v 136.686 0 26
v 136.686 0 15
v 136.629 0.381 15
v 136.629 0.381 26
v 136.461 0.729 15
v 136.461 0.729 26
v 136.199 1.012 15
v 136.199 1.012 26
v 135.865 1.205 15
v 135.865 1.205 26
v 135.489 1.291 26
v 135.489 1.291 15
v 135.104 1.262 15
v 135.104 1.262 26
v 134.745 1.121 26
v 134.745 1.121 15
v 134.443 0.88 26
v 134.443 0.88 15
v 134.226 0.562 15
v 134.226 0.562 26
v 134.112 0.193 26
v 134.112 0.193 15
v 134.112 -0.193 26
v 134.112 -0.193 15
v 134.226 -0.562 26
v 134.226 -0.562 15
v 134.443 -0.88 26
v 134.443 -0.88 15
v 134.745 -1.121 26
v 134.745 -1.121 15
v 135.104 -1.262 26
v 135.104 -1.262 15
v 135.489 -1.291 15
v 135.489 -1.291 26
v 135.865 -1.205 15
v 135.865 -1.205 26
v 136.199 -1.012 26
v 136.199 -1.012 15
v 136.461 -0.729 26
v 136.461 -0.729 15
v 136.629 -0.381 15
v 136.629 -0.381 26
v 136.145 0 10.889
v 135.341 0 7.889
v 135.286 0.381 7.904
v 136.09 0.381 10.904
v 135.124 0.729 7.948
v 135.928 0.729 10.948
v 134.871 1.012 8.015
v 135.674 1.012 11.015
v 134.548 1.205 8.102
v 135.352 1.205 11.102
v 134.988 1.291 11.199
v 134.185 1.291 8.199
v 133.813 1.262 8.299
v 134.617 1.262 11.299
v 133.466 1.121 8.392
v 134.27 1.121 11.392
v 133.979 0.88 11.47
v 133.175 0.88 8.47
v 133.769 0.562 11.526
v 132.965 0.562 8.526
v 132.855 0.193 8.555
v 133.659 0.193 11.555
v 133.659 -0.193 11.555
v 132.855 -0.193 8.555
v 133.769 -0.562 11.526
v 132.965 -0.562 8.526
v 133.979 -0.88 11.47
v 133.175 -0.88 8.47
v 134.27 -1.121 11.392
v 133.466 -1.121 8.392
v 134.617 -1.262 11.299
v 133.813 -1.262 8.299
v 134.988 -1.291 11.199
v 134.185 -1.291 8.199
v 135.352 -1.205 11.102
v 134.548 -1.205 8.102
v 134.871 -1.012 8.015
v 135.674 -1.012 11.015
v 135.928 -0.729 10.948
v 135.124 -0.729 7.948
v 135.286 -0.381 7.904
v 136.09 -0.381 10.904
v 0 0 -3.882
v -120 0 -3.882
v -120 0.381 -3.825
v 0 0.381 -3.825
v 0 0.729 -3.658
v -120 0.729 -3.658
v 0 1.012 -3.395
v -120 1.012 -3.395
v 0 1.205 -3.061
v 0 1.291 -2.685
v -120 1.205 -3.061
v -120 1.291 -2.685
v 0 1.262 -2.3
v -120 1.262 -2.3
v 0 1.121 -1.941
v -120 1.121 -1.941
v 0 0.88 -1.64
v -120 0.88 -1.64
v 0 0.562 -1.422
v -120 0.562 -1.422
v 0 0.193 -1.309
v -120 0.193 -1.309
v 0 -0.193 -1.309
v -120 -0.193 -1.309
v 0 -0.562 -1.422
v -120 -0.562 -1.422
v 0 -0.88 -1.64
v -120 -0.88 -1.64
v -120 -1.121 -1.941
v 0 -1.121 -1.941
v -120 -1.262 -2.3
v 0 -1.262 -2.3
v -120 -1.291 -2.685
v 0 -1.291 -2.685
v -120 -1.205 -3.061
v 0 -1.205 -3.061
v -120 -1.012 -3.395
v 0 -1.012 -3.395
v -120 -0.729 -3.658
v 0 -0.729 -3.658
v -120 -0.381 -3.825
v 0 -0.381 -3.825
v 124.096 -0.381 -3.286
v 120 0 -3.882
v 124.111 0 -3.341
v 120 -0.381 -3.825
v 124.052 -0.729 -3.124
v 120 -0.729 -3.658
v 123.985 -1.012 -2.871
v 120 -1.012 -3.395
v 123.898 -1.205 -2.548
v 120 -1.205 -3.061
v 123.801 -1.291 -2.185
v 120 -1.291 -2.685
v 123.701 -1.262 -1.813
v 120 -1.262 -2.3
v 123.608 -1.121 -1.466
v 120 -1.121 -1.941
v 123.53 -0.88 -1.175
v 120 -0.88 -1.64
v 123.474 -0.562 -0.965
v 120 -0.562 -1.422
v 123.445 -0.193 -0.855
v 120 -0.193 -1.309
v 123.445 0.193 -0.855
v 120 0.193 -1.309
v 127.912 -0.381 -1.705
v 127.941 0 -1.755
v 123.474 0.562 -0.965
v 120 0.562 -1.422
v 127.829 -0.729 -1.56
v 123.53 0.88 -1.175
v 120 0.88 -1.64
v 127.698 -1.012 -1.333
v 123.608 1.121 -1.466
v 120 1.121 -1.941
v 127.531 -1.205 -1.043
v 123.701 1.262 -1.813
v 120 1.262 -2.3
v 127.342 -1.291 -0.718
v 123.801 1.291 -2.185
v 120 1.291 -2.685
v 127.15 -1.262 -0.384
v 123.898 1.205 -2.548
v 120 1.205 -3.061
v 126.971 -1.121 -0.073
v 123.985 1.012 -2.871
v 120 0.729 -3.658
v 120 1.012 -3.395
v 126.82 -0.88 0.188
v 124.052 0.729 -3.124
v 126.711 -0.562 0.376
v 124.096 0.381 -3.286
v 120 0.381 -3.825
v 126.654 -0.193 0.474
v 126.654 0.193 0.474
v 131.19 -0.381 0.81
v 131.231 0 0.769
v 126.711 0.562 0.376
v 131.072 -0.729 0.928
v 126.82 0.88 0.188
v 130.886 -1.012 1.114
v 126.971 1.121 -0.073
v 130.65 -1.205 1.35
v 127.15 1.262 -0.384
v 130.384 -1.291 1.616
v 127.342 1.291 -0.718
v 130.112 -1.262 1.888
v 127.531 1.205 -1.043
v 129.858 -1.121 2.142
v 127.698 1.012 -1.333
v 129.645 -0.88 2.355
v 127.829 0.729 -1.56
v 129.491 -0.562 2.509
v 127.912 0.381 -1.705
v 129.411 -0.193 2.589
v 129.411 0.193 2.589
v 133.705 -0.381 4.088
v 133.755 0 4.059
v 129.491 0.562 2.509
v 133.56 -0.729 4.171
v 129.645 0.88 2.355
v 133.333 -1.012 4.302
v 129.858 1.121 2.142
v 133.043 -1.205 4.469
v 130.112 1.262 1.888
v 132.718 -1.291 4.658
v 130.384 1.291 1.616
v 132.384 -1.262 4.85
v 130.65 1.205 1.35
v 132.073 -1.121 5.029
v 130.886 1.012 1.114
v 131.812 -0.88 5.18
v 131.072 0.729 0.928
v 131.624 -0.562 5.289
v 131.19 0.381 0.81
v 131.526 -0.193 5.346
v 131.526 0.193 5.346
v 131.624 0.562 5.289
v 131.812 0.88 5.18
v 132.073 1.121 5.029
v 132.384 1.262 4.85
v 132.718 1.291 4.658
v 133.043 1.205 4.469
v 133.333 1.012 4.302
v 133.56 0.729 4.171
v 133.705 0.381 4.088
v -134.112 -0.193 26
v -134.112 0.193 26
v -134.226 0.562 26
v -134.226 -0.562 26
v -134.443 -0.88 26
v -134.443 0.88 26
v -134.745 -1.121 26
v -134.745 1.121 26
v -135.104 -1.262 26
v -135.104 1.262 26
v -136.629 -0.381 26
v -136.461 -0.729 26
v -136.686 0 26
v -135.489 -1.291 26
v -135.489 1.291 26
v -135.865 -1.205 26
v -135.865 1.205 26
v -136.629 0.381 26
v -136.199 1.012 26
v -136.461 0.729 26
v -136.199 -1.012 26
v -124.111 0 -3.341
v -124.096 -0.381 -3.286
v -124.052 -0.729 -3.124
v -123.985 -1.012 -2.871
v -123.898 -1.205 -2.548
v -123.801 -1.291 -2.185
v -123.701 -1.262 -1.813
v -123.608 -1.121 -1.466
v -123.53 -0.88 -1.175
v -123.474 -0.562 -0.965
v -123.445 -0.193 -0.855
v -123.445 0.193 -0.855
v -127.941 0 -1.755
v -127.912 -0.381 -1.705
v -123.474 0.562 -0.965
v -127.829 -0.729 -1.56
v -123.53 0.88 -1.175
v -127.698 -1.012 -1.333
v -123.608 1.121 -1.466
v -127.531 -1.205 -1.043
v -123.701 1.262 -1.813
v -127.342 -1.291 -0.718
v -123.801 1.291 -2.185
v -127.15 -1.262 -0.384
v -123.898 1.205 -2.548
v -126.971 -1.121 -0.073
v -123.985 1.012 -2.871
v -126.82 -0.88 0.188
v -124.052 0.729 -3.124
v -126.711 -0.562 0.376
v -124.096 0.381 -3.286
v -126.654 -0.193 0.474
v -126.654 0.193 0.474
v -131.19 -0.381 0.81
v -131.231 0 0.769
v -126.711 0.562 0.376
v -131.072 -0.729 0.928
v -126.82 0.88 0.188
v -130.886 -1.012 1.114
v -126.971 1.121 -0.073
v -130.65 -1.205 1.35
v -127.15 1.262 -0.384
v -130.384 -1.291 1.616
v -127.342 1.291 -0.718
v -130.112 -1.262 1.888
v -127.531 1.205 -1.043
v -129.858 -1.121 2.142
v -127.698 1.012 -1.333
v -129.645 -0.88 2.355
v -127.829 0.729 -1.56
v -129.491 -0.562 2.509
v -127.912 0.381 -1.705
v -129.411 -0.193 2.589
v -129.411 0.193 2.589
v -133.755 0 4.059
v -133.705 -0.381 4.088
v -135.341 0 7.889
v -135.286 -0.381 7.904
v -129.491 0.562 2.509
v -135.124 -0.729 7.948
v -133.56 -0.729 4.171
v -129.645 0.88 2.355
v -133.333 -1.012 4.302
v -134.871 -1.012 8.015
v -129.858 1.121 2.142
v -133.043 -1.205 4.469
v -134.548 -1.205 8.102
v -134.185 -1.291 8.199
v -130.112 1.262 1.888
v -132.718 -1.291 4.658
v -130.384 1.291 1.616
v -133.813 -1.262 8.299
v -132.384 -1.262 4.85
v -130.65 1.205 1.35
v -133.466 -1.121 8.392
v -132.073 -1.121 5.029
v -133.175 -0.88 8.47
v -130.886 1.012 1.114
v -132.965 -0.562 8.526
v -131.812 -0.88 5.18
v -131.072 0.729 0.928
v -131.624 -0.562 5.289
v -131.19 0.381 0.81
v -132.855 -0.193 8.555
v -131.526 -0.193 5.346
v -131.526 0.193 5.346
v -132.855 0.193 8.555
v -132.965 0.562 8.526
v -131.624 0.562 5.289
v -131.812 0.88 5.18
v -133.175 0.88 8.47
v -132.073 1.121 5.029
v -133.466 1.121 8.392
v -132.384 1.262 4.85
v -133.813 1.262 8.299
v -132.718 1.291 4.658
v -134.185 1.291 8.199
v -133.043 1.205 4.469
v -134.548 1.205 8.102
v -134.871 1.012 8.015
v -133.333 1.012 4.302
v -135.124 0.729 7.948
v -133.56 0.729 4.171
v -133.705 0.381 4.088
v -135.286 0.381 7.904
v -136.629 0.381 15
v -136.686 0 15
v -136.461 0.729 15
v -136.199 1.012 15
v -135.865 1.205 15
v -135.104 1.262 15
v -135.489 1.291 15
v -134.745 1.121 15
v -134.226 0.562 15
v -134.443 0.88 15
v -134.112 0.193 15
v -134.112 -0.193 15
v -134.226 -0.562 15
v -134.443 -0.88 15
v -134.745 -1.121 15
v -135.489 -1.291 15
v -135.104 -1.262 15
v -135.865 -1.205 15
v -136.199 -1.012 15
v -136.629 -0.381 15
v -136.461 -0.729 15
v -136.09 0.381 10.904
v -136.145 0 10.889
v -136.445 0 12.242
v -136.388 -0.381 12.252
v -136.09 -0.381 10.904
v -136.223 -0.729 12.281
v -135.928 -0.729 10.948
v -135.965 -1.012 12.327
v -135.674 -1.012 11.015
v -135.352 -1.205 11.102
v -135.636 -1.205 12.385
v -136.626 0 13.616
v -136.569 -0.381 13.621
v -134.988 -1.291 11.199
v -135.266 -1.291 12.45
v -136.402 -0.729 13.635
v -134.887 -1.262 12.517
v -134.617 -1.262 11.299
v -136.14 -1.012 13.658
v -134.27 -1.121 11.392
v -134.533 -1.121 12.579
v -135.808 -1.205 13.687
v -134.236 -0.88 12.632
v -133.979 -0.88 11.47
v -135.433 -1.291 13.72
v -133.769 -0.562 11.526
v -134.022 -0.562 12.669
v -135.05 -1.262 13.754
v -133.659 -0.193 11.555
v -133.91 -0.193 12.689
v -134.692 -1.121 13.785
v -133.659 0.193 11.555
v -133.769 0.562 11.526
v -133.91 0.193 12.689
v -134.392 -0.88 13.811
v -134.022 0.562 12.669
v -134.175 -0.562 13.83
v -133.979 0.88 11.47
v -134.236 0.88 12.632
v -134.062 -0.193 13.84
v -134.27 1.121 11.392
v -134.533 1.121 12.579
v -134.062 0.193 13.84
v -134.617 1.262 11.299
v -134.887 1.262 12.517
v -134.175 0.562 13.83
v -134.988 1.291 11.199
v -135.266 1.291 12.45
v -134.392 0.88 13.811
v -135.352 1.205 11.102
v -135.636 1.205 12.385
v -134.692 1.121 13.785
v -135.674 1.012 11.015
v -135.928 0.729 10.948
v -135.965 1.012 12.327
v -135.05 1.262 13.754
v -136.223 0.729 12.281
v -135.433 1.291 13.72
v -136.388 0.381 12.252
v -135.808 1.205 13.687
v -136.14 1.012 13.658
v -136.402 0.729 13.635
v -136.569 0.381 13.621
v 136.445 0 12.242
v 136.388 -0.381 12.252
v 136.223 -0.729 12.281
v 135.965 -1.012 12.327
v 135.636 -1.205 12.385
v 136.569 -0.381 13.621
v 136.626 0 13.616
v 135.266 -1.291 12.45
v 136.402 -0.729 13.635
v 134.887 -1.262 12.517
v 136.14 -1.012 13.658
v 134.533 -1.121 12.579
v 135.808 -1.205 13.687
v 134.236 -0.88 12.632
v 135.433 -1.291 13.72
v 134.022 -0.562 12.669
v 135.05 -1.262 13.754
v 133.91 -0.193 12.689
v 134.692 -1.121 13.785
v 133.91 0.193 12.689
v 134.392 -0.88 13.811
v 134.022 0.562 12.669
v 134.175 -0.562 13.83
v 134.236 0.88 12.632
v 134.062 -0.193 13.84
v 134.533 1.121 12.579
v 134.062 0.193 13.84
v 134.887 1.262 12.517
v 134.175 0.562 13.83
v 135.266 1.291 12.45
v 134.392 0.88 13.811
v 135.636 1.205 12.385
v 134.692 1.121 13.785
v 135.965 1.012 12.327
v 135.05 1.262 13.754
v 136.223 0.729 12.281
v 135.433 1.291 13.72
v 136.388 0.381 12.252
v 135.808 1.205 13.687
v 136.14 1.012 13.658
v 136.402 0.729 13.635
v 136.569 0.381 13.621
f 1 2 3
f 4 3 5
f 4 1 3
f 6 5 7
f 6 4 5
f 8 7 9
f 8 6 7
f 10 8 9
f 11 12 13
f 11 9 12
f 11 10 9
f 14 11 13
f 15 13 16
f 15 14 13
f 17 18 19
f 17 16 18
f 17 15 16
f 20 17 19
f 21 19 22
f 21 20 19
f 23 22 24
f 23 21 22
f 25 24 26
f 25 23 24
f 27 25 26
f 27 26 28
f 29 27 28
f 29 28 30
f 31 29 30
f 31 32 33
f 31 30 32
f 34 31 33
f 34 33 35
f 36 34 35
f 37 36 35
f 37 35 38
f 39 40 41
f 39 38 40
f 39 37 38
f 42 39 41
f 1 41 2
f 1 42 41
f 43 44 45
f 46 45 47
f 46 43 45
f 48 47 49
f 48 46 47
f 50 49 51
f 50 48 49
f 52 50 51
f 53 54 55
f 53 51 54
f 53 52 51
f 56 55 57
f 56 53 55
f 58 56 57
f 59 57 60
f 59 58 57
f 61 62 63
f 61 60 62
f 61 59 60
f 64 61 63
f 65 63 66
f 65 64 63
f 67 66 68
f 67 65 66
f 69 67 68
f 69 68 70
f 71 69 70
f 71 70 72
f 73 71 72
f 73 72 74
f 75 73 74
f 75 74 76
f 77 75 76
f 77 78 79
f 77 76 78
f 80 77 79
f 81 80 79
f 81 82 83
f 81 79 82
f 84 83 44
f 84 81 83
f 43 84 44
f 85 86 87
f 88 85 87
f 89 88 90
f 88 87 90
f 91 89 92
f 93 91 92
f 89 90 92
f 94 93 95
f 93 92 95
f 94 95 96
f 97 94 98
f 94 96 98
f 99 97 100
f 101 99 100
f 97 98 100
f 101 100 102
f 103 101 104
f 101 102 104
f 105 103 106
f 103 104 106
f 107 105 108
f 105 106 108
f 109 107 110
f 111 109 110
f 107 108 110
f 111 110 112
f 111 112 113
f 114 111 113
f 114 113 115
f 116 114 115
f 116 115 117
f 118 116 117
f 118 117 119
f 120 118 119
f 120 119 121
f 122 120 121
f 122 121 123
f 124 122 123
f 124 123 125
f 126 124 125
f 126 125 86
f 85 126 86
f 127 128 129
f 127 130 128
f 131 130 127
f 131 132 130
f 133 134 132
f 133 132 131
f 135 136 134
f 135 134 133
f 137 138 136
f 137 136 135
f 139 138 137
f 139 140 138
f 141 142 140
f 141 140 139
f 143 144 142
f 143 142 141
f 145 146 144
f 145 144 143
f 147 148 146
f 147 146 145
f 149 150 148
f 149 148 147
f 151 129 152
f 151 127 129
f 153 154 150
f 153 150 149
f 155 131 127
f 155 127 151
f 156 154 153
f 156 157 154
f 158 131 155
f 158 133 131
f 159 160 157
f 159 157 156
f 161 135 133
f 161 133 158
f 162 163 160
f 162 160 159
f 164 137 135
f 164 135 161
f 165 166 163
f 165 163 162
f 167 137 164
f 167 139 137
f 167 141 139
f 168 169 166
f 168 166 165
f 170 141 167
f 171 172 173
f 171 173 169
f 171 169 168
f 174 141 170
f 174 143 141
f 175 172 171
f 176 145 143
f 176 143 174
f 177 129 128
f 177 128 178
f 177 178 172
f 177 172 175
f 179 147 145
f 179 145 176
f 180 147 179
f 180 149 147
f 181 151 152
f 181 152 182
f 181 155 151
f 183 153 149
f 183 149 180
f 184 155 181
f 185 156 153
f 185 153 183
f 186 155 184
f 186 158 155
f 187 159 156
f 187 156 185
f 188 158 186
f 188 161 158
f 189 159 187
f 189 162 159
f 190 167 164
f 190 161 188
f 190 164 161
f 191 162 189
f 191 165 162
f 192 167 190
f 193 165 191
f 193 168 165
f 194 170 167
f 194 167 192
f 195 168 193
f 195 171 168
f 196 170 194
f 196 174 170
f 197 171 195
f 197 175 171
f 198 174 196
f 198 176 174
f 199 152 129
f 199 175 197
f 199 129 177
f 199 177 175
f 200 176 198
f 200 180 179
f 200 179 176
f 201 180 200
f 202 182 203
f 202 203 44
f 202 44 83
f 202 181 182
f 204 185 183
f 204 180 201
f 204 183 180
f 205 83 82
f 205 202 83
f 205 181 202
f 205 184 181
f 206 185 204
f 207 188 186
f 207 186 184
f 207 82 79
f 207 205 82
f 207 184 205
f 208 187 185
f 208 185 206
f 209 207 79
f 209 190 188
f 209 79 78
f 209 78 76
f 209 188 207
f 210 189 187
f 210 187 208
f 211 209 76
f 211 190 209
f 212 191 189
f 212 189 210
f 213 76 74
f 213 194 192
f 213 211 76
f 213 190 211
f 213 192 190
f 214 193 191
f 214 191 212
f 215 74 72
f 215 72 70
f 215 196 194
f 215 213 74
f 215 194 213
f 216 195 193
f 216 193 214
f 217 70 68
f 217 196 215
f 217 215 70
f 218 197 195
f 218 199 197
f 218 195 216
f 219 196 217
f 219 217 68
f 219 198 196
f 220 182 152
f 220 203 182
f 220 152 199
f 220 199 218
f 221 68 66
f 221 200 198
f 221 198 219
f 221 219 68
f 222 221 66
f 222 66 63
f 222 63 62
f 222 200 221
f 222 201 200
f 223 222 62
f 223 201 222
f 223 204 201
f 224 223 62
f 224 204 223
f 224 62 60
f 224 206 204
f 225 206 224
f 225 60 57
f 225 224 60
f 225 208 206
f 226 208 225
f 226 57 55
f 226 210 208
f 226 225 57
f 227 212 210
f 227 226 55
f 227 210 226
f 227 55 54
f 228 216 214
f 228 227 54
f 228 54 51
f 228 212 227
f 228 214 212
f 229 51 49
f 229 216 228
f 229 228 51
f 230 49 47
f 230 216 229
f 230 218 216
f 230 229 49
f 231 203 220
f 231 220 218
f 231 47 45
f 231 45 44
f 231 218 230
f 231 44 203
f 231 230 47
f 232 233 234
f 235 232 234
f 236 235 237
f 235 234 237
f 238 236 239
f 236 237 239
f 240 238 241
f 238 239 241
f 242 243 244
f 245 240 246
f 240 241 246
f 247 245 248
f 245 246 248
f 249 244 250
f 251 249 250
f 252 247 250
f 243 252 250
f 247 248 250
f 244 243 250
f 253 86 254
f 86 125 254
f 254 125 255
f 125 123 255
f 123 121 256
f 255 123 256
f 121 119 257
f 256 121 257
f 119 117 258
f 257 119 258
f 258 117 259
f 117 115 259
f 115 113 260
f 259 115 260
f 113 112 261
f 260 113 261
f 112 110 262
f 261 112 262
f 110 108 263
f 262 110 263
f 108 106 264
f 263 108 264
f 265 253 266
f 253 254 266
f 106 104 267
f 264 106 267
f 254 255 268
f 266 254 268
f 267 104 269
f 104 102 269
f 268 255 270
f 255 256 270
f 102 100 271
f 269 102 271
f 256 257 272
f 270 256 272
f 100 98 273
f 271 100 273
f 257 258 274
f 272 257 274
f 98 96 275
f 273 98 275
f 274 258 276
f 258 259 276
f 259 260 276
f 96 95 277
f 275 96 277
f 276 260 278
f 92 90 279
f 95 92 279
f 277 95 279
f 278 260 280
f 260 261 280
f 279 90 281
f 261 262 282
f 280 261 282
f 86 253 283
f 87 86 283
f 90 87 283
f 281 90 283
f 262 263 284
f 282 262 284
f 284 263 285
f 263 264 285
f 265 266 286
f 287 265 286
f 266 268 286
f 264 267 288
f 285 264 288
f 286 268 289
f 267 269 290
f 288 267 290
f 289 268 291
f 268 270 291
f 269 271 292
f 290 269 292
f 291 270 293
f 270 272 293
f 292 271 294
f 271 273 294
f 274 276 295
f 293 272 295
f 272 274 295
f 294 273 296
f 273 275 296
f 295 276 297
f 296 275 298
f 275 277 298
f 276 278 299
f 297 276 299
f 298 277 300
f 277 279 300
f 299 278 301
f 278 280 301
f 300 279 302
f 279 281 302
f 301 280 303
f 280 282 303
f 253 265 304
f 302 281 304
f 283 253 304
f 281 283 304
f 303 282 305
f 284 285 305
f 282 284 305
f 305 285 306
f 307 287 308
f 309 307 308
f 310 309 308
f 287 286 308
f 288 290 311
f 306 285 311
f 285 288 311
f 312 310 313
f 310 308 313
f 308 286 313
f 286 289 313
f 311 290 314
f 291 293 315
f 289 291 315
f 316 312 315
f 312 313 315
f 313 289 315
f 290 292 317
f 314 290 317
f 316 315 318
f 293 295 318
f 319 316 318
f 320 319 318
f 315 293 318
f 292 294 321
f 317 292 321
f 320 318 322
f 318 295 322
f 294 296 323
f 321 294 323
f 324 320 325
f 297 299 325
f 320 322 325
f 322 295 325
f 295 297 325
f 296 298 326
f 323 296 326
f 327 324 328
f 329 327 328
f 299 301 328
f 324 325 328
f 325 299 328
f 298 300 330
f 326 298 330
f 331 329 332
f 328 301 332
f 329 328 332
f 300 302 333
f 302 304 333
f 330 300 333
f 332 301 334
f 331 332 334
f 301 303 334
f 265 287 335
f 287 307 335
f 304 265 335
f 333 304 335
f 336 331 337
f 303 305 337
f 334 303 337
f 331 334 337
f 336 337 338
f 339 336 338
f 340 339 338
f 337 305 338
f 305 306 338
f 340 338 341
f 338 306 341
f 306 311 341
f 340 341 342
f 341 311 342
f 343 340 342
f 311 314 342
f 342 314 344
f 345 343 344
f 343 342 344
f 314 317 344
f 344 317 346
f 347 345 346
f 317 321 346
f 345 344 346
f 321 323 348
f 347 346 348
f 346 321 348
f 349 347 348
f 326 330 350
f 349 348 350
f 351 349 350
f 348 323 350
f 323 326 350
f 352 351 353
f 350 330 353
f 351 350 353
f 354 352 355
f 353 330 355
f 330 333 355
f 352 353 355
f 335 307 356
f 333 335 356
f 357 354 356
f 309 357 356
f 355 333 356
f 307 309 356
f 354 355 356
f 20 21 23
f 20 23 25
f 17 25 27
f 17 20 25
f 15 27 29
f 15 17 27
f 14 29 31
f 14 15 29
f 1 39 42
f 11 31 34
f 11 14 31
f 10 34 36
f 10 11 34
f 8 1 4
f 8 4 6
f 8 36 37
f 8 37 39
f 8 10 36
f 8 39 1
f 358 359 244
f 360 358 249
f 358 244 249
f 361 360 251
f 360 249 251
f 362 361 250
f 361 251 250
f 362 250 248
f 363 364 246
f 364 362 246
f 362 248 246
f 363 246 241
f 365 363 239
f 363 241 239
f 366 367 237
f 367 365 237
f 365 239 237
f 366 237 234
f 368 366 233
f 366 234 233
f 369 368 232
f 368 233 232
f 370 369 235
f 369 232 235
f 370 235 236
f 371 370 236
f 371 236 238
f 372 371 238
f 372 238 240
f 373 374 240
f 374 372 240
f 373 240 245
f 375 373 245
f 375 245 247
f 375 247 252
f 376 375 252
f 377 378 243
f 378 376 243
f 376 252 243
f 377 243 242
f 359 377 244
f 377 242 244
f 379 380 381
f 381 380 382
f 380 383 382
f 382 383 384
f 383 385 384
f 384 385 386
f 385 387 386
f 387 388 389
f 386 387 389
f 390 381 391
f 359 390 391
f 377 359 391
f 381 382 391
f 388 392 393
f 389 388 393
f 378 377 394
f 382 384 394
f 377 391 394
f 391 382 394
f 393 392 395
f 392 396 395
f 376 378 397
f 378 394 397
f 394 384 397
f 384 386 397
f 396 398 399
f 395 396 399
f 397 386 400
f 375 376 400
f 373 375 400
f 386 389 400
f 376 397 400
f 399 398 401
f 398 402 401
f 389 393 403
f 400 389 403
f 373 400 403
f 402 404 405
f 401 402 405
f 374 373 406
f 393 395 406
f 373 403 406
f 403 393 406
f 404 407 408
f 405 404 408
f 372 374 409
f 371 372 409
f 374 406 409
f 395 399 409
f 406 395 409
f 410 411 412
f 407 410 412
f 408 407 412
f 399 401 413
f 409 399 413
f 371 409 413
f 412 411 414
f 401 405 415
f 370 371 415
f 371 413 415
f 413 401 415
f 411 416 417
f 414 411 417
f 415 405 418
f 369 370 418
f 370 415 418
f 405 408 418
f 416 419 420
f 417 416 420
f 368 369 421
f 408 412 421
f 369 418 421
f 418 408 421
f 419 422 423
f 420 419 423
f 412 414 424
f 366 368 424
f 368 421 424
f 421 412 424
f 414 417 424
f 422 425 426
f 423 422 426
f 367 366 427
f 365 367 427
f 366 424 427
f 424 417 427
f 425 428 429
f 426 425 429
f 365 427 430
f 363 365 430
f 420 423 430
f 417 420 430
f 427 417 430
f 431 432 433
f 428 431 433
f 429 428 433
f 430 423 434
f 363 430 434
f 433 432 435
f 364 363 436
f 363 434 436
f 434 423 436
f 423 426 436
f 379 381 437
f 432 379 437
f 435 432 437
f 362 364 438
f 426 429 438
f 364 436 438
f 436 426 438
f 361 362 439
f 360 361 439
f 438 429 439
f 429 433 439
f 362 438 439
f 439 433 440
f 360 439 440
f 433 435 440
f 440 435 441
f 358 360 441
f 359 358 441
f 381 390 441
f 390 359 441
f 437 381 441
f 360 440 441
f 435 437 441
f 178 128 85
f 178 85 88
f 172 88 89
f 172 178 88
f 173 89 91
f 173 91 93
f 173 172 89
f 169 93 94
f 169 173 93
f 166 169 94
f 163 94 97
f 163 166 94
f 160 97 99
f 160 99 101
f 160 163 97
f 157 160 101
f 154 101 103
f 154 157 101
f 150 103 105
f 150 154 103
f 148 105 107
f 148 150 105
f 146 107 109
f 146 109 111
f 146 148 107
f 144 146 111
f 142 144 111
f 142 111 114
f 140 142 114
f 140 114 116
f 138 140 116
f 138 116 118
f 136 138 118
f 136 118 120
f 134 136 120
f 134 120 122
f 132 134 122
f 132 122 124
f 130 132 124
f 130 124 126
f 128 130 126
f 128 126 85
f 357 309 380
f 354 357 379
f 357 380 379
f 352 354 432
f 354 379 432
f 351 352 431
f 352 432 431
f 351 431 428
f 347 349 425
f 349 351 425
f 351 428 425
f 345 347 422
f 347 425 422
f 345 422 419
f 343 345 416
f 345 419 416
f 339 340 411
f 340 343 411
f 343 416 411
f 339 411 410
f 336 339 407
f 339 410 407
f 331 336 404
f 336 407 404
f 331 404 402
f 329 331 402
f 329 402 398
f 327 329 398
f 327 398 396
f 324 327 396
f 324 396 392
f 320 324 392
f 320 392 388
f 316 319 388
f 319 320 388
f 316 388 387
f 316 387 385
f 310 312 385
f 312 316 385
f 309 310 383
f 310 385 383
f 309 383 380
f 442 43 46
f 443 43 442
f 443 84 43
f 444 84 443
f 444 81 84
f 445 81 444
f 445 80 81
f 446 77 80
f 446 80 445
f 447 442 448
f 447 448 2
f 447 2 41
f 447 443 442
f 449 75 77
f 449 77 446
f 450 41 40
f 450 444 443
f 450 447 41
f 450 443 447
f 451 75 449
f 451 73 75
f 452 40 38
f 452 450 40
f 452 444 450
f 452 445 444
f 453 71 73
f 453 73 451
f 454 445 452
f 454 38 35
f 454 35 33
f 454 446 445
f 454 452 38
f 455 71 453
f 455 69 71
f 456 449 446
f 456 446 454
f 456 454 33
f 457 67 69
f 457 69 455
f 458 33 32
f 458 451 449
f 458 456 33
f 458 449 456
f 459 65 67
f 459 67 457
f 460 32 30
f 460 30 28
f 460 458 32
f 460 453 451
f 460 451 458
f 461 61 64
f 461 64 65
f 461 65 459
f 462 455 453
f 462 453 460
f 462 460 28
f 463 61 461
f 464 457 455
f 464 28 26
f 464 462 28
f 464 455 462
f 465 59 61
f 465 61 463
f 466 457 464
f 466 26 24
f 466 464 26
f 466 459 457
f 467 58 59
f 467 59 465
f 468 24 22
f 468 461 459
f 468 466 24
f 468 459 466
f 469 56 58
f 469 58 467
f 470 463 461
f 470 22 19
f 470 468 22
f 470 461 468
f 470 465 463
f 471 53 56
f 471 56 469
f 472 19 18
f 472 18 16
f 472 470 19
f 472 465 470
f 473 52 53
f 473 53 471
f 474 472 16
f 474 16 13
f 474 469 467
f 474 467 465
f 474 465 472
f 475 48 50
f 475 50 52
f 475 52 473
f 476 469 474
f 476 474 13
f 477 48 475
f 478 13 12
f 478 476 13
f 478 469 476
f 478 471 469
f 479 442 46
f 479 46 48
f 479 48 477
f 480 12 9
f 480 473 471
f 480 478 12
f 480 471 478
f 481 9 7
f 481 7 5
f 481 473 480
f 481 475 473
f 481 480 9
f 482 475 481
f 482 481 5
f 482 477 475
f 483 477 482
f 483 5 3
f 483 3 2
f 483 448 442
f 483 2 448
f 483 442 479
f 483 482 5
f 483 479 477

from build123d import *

# Parameters (mm, degrees)
SKETCH2_R = 1.29413


with BuildPart() as part:
    # Sweep1: sweep along a path in Sketch1
    with BuildLine(Plane(origin=(0, 0, 0), x_dir=(1, 0, 0), z_dir=(0, 1, 0))) as sweep1_path:
        Line((0, 2.58826), (120, 2.58826))
        ThreePointArc((120, 2.58826), (128.880770004, -0.4263552), (134.091177095, -8.224280477))
        Line((134.091177095, -8.224280477), (134.895024672, -11.224280477))
        ThreePointArc((134.895024672, -11.224280477), (135.267302991, -13.095849971), (135.392107577, -15))
        Line((135.392107577, -15), (135.392107577, -26))
    # Sketch2 → Sweep1 (sweep)
    with BuildSketch(Plane(origin=(0, 0, 0), x_dir=(0, 0, -1), z_dir=(1, 0, 0))):
        with Locations((2.58826, 0)):
            Circle(SKETCH2_R)
    sweep1 = sweep(path=sweep1_path.line)

    # Mirror1: Sweep1 across plane
    add(sweep1.mirror(Plane(origin=(0, 0, 0), x_dir=(0, 0, 1), z_dir=(1, 0, 0))))


solid = part.part
